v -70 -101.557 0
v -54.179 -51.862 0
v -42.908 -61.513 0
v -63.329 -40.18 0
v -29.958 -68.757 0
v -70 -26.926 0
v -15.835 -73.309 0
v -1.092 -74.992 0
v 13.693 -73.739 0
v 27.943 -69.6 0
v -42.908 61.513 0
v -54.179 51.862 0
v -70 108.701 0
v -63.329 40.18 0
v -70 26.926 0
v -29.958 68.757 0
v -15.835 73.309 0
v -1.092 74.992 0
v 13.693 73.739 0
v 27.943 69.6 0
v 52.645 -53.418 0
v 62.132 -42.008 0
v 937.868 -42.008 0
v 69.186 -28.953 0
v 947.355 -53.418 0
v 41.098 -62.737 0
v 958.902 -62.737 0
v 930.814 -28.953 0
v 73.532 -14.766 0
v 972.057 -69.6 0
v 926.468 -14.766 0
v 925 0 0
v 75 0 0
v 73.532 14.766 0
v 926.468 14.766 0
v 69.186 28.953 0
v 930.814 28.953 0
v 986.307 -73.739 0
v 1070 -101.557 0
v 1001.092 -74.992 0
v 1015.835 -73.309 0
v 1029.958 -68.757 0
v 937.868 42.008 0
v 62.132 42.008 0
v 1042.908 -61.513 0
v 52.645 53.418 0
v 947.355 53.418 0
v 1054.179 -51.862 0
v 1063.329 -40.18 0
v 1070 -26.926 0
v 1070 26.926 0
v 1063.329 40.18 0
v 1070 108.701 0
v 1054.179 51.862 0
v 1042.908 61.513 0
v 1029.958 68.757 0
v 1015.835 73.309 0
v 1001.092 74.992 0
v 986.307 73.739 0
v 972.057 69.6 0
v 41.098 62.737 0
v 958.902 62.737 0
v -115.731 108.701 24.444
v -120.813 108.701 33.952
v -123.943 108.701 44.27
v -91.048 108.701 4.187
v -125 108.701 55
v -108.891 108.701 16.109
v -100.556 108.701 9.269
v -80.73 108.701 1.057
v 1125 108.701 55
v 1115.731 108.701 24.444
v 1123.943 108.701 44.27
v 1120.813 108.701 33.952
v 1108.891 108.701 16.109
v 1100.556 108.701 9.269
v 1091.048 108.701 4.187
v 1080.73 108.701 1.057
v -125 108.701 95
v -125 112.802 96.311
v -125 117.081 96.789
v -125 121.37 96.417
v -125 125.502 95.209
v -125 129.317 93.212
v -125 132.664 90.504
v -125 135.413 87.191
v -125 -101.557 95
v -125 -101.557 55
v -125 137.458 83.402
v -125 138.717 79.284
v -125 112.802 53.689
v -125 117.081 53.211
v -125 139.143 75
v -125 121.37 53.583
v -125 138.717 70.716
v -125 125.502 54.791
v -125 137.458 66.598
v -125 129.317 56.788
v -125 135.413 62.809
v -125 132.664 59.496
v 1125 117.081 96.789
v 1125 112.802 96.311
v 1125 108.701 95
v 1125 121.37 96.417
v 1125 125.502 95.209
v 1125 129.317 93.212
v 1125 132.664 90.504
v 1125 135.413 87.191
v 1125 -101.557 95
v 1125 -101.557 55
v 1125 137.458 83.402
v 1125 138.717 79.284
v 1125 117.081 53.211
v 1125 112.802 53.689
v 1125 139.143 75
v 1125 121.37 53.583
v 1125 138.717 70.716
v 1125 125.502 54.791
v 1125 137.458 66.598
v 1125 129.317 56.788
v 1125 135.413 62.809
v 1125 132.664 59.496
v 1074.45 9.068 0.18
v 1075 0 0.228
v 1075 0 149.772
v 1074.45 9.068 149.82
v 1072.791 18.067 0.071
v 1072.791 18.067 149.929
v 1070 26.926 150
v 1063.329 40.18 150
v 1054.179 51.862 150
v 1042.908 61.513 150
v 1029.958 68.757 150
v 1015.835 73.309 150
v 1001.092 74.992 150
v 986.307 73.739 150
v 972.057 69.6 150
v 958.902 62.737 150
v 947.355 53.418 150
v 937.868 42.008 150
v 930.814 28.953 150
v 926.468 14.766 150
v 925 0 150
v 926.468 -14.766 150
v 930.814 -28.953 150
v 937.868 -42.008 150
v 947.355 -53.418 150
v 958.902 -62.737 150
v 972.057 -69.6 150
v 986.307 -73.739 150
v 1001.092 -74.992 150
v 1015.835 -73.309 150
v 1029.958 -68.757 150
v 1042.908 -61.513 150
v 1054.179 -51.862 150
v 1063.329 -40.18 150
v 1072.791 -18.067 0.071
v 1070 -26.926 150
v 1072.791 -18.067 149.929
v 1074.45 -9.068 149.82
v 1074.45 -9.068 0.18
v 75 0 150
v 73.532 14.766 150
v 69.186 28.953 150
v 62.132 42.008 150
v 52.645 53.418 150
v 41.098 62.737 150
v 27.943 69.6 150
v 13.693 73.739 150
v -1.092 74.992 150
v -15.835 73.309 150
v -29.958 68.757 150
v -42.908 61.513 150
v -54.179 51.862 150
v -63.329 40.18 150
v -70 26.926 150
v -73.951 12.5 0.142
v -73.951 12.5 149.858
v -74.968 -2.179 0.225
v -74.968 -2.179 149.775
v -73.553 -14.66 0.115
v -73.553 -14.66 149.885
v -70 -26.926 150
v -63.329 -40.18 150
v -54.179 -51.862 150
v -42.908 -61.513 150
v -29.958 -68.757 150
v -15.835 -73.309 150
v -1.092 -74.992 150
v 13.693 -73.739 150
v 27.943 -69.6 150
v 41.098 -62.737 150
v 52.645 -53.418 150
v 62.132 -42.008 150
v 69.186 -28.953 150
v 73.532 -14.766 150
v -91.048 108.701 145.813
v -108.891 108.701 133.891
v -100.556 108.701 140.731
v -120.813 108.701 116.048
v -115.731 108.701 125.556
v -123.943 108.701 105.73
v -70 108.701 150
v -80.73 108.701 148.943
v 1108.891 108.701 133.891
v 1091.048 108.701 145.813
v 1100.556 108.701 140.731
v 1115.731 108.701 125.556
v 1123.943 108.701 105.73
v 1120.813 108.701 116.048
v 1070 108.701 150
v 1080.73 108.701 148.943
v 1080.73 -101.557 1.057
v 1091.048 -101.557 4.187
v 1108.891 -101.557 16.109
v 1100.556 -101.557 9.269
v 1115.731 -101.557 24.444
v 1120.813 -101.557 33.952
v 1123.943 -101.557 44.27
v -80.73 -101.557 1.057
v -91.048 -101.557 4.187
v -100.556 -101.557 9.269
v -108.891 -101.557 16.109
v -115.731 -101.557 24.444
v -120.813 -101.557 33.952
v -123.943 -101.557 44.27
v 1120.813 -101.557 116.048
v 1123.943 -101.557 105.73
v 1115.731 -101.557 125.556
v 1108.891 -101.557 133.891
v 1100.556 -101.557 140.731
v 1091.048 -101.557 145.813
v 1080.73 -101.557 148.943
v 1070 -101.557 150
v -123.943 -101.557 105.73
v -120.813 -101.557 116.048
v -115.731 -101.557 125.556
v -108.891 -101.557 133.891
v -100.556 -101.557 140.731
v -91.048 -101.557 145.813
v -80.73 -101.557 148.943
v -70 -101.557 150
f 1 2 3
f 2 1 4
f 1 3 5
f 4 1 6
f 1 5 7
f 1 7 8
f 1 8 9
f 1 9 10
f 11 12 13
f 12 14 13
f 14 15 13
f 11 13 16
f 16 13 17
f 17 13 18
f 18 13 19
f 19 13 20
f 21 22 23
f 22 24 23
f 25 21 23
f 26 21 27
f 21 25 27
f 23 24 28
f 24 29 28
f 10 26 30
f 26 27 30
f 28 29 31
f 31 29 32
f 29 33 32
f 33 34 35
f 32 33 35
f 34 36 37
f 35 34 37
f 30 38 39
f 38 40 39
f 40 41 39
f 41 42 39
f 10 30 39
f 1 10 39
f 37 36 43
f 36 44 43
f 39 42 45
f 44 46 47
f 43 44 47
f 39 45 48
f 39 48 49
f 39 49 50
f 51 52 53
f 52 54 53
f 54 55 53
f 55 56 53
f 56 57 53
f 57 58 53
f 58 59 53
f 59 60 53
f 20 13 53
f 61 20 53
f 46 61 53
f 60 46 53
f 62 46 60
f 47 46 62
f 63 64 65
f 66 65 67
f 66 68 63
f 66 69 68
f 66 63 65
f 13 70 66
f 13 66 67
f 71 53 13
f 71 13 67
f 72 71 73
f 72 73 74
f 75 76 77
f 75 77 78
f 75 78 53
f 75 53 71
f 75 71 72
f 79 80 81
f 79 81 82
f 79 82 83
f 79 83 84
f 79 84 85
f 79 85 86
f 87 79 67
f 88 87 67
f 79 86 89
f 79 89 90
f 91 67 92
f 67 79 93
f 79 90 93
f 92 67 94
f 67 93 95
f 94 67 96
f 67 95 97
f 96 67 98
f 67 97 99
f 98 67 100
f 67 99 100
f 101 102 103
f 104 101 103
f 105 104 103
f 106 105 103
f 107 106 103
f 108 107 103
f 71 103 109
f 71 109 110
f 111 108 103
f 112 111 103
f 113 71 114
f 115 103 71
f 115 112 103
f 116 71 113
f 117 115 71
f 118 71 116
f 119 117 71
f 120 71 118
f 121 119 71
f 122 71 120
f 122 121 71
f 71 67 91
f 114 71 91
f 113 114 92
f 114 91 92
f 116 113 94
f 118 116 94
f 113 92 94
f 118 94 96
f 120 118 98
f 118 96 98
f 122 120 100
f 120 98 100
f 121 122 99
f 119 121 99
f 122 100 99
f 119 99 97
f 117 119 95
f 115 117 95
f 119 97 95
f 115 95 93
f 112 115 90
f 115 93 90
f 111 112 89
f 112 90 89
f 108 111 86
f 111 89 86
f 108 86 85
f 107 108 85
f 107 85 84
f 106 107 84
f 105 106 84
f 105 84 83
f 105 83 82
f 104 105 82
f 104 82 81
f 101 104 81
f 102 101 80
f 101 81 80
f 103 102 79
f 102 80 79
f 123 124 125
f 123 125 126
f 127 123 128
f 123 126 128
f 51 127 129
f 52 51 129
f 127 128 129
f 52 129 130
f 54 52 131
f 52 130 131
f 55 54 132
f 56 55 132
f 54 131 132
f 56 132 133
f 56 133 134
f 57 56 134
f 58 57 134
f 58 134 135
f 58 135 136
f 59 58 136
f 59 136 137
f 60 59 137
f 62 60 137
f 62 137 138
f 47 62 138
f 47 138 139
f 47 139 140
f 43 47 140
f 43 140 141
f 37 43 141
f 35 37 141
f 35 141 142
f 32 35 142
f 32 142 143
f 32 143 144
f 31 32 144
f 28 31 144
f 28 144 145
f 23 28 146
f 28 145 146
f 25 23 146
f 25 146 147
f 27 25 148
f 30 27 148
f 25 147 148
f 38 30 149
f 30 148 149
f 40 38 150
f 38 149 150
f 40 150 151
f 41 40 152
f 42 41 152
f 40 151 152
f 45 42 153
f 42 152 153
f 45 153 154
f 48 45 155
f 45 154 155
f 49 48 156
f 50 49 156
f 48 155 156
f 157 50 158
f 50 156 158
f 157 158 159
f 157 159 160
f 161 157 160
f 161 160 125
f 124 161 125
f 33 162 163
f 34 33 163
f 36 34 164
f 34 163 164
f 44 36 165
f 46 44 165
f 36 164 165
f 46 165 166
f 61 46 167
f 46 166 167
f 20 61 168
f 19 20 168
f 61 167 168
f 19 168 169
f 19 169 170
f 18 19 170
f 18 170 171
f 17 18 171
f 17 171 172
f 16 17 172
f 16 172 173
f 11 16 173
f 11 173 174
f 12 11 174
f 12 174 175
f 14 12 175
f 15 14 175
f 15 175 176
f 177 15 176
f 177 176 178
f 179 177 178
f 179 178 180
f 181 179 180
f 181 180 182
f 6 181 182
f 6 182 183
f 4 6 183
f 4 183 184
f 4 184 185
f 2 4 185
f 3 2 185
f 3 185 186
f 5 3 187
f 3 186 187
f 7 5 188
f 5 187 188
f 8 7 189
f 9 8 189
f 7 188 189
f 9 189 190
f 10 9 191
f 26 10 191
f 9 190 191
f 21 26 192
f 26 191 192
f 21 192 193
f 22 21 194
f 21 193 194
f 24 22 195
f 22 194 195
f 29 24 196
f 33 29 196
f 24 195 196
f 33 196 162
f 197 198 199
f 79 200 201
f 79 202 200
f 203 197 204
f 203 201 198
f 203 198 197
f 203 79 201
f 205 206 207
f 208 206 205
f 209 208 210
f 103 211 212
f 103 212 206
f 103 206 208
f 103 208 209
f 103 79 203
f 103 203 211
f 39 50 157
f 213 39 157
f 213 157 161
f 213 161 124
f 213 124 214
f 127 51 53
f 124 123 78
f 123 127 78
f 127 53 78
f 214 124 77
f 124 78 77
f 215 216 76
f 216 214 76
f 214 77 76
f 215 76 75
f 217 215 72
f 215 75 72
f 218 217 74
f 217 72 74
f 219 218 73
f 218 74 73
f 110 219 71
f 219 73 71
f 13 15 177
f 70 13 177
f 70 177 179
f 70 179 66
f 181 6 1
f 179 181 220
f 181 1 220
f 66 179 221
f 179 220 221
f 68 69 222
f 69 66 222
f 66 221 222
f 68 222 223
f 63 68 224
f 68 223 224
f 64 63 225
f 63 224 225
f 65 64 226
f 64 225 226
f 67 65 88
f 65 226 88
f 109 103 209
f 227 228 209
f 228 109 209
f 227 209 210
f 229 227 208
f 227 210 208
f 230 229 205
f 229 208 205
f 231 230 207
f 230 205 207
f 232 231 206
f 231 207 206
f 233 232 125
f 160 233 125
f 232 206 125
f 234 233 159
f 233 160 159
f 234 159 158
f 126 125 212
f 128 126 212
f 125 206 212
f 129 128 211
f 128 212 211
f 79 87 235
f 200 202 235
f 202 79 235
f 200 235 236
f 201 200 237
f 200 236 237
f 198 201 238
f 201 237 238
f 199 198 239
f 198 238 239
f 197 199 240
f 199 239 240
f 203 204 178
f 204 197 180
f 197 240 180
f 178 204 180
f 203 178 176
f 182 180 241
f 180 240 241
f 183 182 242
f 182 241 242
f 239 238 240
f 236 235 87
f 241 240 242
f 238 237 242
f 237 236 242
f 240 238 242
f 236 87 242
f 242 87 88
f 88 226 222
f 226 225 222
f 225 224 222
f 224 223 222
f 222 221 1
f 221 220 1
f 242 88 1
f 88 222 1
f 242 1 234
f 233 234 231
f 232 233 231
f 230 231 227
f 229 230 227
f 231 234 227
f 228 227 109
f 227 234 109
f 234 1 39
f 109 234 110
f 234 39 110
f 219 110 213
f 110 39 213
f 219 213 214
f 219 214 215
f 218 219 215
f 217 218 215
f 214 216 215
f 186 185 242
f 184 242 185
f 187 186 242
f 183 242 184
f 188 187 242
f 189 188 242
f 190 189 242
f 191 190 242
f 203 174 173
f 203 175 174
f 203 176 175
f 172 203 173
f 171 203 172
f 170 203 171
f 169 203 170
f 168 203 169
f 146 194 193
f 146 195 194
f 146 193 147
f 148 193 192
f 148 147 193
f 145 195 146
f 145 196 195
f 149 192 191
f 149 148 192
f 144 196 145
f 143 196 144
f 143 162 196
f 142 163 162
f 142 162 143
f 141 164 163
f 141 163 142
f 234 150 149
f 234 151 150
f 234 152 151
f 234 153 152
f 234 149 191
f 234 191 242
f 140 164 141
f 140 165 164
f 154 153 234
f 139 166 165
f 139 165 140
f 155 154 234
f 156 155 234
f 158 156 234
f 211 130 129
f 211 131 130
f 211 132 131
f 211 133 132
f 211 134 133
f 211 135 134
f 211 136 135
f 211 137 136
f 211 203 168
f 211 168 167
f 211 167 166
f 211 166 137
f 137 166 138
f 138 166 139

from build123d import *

# Parameters (mm, degrees)
SKETCH1_W           = 1250
SKETCH1_H           = 210.257392811
BOSS_EXTRUDE1_DEPTH = 150
SKETCH2_R           = 75
CUT_EXTRUDE1_DEPTH  = 150
FILLET3_R           = 55
BOSS_EXTRUDE2_DEPTH = 1250


with BuildPart() as part:
    # Sketch1 → Boss-Extrude1 (new body)
    with BuildSketch(Plane.XY):
        with Locations((500, 3.571821645)):
            Rectangle(SKETCH1_W, SKETCH1_H)
    extrude(amount=BOSS_EXTRUDE1_DEPTH)

    # Sketch2 → Cut-Extrude1 (cut)
    with BuildSketch(Plane.XY.offset(150)):
        Circle(SKETCH2_R)
        with Locations((1000, 0)):
            Circle(SKETCH2_R)
    extrude(amount=-CUT_EXTRUDE1_DEPTH, mode=Mode.SUBTRACT)

    # Fillet3
    # the kernel refuses this fillet: 55 mm, written as the material it takes off along each edge
    with BuildSketch(Plane(origin=(1125, 246.20051805, 150), x_dir=(0, 0, -1), z_dir=(0, -1, 0)), Plane(origin=(-125, -239.056874761, 150), x_dir=(0, 0, -1), z_dir=(0, 1, 0))) as fillet3_piece_1:
        with BuildLine():
            CenterArc((FILLET3_R, -FILLET3_R), FILLET3_R, 90, 90)
            Line((0, -FILLET3_R), (0, 0))
            Line((0, 0), (FILLET3_R, 0))
        make_face()
    extrude(amount=485.257392811, mode=Mode.SUBTRACT)
    with BuildSketch(Plane(origin=(1125, 246.20051805, 0), x_dir=(0, 0, 1), z_dir=(0, -1, 0)), Plane(origin=(-125, -239.056874761, 0), x_dir=(0, 0, 1), z_dir=(0, 1, 0))) as fillet3_piece_2:
        with BuildLine():
            CenterArc((FILLET3_R, FILLET3_R), FILLET3_R, 180, 90)
            Line((0, FILLET3_R), (0, 0))
            Line((0, 0), (FILLET3_R, 0))
        make_face()
    extrude(amount=485.257392811, mode=Mode.SUBTRACT)

    # Sketch3 → Boss-Extrude2 (add, through all)
    with BuildSketch(Plane.ZY.offset(125)):
        with BuildLine():
            Line((95, 108.70051805), (55, 108.70051805))
            ThreePointArc((55, 108.70051805), (75, 139.142597248), (95, 108.70051805))
        make_face()
    extrude(amount=-BOSS_EXTRUDE2_DEPTH)


solid = part.part
